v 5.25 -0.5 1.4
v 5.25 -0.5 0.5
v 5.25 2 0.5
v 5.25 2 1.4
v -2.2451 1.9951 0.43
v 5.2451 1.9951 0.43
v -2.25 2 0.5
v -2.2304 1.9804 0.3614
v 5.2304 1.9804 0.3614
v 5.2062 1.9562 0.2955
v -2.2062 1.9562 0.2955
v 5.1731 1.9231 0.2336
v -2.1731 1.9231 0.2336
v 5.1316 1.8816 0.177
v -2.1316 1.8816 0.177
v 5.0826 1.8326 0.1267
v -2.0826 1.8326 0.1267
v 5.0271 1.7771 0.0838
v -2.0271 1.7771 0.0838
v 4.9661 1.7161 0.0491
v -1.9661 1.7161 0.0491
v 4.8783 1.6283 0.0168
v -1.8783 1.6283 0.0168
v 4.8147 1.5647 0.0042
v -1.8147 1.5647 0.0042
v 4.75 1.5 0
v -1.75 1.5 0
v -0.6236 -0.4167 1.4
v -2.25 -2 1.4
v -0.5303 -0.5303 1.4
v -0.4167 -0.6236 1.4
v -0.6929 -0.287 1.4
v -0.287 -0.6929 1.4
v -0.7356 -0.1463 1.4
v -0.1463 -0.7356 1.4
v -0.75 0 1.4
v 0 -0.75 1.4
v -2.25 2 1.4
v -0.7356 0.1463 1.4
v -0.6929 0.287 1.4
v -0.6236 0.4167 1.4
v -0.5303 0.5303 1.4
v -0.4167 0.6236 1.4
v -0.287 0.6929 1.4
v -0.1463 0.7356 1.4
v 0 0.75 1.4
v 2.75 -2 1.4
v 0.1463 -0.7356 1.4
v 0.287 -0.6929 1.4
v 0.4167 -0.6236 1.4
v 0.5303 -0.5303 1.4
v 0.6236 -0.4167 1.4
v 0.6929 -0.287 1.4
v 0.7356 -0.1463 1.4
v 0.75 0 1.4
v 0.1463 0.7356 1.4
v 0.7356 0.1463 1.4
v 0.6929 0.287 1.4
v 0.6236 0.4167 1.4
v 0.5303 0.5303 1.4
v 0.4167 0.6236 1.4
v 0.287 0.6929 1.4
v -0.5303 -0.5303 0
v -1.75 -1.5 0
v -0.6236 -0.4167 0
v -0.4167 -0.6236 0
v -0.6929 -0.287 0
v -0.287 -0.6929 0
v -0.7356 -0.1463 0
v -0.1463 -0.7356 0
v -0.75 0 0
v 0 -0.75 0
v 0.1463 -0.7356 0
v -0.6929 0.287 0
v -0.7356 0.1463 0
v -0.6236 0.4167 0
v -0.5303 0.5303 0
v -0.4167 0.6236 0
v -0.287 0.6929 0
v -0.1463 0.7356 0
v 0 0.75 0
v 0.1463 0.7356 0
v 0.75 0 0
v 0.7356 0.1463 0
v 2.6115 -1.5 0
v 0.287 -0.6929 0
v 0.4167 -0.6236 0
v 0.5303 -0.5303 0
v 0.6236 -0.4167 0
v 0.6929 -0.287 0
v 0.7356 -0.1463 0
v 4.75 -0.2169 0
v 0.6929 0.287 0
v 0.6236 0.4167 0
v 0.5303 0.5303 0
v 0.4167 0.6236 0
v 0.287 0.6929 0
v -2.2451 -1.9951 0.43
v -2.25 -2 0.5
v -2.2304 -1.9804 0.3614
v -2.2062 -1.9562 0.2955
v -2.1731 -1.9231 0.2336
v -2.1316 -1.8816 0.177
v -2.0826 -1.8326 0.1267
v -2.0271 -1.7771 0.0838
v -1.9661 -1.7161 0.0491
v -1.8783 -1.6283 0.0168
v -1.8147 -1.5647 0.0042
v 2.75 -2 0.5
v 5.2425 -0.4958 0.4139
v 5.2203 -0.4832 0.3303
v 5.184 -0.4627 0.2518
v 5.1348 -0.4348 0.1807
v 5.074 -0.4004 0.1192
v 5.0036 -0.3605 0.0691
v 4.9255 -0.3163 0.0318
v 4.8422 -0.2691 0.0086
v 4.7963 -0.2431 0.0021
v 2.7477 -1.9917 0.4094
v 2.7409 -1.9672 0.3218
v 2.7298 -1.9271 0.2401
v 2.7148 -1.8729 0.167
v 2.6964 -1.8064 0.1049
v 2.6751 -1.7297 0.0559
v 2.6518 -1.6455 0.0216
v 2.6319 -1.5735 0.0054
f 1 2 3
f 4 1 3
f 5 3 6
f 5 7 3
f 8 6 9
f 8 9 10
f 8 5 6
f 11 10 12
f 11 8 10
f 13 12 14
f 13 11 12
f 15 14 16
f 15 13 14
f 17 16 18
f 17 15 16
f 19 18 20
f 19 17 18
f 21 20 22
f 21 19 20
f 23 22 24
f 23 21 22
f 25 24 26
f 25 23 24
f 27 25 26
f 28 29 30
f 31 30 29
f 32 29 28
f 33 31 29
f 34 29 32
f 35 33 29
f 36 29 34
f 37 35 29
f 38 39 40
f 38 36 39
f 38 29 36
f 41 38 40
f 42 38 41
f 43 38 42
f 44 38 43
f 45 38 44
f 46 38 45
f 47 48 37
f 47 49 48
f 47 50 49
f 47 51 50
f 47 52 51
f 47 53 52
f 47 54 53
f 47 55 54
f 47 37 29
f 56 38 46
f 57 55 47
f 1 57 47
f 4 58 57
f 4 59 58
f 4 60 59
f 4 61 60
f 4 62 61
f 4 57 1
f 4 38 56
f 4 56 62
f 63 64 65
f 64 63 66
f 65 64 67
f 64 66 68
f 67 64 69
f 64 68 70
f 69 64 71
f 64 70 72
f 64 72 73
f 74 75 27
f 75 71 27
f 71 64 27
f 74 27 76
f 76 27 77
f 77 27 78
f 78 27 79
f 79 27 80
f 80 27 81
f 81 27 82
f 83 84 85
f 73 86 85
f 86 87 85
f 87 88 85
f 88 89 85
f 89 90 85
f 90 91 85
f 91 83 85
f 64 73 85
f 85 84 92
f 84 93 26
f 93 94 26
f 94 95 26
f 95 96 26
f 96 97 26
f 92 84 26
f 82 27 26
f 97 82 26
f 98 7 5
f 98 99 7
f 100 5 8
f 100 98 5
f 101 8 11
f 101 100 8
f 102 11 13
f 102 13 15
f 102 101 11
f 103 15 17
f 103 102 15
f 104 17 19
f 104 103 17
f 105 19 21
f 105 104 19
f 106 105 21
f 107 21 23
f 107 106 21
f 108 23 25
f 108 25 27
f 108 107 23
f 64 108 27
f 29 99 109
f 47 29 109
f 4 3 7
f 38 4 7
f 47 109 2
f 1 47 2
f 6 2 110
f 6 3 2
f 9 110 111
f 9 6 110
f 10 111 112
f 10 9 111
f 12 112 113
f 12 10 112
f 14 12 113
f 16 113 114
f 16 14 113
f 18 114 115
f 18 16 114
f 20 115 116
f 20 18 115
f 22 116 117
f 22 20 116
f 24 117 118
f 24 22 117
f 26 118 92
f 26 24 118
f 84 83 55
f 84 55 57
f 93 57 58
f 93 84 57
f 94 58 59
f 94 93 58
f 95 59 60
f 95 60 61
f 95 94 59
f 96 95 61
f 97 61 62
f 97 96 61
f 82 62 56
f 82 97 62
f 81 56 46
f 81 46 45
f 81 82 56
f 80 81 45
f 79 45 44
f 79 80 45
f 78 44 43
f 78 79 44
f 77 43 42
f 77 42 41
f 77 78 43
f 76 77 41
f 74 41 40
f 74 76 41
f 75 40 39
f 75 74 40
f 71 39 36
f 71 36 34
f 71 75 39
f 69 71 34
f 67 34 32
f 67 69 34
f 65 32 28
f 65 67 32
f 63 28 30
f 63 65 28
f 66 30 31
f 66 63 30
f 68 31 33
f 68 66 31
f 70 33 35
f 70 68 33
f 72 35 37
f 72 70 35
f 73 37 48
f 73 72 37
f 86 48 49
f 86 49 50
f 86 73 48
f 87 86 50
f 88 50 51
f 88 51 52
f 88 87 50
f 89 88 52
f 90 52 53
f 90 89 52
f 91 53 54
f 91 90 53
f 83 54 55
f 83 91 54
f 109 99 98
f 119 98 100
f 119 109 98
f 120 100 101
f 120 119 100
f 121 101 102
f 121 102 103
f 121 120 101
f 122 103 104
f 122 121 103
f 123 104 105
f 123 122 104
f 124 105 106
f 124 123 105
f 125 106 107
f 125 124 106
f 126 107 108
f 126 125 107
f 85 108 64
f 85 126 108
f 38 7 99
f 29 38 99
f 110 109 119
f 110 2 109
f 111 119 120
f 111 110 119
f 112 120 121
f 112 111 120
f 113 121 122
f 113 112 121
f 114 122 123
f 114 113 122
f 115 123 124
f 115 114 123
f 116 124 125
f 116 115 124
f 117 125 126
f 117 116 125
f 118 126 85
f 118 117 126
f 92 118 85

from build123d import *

# Parameters (mm, degrees)
SKETCH1_R           = 0.75
BOSS_EXTRUDE1_DEPTH = 1.4
FILLET1_R           = 0.5


with BuildPart() as part:
    # Sketch1 → Boss-Extrude1 (new body)
    with BuildSketch(Plane.XY):
        Polygon((-2.25, 2), (-2.25, -2), (2.75, -2), (5.25, -0.5), (5.25, 2), align=None)
        Circle(SKETCH1_R, mode=Mode.SUBTRACT)
    extrude(amount=BOSS_EXTRUDE1_DEPTH)

    # Fillet1
    fillet1_edges = [part.edges().sort_by_distance(p)[0] for p in [
        (5.25, 0.75, 0),
        (4, -1.25, 0),
        (0.25, -2, 0),
        (-2.25, 0, 0),
        (1.5, 2, 0),
    ]]
    fillet(fillet1_edges, radius=FILLET1_R)


solid = part.part
